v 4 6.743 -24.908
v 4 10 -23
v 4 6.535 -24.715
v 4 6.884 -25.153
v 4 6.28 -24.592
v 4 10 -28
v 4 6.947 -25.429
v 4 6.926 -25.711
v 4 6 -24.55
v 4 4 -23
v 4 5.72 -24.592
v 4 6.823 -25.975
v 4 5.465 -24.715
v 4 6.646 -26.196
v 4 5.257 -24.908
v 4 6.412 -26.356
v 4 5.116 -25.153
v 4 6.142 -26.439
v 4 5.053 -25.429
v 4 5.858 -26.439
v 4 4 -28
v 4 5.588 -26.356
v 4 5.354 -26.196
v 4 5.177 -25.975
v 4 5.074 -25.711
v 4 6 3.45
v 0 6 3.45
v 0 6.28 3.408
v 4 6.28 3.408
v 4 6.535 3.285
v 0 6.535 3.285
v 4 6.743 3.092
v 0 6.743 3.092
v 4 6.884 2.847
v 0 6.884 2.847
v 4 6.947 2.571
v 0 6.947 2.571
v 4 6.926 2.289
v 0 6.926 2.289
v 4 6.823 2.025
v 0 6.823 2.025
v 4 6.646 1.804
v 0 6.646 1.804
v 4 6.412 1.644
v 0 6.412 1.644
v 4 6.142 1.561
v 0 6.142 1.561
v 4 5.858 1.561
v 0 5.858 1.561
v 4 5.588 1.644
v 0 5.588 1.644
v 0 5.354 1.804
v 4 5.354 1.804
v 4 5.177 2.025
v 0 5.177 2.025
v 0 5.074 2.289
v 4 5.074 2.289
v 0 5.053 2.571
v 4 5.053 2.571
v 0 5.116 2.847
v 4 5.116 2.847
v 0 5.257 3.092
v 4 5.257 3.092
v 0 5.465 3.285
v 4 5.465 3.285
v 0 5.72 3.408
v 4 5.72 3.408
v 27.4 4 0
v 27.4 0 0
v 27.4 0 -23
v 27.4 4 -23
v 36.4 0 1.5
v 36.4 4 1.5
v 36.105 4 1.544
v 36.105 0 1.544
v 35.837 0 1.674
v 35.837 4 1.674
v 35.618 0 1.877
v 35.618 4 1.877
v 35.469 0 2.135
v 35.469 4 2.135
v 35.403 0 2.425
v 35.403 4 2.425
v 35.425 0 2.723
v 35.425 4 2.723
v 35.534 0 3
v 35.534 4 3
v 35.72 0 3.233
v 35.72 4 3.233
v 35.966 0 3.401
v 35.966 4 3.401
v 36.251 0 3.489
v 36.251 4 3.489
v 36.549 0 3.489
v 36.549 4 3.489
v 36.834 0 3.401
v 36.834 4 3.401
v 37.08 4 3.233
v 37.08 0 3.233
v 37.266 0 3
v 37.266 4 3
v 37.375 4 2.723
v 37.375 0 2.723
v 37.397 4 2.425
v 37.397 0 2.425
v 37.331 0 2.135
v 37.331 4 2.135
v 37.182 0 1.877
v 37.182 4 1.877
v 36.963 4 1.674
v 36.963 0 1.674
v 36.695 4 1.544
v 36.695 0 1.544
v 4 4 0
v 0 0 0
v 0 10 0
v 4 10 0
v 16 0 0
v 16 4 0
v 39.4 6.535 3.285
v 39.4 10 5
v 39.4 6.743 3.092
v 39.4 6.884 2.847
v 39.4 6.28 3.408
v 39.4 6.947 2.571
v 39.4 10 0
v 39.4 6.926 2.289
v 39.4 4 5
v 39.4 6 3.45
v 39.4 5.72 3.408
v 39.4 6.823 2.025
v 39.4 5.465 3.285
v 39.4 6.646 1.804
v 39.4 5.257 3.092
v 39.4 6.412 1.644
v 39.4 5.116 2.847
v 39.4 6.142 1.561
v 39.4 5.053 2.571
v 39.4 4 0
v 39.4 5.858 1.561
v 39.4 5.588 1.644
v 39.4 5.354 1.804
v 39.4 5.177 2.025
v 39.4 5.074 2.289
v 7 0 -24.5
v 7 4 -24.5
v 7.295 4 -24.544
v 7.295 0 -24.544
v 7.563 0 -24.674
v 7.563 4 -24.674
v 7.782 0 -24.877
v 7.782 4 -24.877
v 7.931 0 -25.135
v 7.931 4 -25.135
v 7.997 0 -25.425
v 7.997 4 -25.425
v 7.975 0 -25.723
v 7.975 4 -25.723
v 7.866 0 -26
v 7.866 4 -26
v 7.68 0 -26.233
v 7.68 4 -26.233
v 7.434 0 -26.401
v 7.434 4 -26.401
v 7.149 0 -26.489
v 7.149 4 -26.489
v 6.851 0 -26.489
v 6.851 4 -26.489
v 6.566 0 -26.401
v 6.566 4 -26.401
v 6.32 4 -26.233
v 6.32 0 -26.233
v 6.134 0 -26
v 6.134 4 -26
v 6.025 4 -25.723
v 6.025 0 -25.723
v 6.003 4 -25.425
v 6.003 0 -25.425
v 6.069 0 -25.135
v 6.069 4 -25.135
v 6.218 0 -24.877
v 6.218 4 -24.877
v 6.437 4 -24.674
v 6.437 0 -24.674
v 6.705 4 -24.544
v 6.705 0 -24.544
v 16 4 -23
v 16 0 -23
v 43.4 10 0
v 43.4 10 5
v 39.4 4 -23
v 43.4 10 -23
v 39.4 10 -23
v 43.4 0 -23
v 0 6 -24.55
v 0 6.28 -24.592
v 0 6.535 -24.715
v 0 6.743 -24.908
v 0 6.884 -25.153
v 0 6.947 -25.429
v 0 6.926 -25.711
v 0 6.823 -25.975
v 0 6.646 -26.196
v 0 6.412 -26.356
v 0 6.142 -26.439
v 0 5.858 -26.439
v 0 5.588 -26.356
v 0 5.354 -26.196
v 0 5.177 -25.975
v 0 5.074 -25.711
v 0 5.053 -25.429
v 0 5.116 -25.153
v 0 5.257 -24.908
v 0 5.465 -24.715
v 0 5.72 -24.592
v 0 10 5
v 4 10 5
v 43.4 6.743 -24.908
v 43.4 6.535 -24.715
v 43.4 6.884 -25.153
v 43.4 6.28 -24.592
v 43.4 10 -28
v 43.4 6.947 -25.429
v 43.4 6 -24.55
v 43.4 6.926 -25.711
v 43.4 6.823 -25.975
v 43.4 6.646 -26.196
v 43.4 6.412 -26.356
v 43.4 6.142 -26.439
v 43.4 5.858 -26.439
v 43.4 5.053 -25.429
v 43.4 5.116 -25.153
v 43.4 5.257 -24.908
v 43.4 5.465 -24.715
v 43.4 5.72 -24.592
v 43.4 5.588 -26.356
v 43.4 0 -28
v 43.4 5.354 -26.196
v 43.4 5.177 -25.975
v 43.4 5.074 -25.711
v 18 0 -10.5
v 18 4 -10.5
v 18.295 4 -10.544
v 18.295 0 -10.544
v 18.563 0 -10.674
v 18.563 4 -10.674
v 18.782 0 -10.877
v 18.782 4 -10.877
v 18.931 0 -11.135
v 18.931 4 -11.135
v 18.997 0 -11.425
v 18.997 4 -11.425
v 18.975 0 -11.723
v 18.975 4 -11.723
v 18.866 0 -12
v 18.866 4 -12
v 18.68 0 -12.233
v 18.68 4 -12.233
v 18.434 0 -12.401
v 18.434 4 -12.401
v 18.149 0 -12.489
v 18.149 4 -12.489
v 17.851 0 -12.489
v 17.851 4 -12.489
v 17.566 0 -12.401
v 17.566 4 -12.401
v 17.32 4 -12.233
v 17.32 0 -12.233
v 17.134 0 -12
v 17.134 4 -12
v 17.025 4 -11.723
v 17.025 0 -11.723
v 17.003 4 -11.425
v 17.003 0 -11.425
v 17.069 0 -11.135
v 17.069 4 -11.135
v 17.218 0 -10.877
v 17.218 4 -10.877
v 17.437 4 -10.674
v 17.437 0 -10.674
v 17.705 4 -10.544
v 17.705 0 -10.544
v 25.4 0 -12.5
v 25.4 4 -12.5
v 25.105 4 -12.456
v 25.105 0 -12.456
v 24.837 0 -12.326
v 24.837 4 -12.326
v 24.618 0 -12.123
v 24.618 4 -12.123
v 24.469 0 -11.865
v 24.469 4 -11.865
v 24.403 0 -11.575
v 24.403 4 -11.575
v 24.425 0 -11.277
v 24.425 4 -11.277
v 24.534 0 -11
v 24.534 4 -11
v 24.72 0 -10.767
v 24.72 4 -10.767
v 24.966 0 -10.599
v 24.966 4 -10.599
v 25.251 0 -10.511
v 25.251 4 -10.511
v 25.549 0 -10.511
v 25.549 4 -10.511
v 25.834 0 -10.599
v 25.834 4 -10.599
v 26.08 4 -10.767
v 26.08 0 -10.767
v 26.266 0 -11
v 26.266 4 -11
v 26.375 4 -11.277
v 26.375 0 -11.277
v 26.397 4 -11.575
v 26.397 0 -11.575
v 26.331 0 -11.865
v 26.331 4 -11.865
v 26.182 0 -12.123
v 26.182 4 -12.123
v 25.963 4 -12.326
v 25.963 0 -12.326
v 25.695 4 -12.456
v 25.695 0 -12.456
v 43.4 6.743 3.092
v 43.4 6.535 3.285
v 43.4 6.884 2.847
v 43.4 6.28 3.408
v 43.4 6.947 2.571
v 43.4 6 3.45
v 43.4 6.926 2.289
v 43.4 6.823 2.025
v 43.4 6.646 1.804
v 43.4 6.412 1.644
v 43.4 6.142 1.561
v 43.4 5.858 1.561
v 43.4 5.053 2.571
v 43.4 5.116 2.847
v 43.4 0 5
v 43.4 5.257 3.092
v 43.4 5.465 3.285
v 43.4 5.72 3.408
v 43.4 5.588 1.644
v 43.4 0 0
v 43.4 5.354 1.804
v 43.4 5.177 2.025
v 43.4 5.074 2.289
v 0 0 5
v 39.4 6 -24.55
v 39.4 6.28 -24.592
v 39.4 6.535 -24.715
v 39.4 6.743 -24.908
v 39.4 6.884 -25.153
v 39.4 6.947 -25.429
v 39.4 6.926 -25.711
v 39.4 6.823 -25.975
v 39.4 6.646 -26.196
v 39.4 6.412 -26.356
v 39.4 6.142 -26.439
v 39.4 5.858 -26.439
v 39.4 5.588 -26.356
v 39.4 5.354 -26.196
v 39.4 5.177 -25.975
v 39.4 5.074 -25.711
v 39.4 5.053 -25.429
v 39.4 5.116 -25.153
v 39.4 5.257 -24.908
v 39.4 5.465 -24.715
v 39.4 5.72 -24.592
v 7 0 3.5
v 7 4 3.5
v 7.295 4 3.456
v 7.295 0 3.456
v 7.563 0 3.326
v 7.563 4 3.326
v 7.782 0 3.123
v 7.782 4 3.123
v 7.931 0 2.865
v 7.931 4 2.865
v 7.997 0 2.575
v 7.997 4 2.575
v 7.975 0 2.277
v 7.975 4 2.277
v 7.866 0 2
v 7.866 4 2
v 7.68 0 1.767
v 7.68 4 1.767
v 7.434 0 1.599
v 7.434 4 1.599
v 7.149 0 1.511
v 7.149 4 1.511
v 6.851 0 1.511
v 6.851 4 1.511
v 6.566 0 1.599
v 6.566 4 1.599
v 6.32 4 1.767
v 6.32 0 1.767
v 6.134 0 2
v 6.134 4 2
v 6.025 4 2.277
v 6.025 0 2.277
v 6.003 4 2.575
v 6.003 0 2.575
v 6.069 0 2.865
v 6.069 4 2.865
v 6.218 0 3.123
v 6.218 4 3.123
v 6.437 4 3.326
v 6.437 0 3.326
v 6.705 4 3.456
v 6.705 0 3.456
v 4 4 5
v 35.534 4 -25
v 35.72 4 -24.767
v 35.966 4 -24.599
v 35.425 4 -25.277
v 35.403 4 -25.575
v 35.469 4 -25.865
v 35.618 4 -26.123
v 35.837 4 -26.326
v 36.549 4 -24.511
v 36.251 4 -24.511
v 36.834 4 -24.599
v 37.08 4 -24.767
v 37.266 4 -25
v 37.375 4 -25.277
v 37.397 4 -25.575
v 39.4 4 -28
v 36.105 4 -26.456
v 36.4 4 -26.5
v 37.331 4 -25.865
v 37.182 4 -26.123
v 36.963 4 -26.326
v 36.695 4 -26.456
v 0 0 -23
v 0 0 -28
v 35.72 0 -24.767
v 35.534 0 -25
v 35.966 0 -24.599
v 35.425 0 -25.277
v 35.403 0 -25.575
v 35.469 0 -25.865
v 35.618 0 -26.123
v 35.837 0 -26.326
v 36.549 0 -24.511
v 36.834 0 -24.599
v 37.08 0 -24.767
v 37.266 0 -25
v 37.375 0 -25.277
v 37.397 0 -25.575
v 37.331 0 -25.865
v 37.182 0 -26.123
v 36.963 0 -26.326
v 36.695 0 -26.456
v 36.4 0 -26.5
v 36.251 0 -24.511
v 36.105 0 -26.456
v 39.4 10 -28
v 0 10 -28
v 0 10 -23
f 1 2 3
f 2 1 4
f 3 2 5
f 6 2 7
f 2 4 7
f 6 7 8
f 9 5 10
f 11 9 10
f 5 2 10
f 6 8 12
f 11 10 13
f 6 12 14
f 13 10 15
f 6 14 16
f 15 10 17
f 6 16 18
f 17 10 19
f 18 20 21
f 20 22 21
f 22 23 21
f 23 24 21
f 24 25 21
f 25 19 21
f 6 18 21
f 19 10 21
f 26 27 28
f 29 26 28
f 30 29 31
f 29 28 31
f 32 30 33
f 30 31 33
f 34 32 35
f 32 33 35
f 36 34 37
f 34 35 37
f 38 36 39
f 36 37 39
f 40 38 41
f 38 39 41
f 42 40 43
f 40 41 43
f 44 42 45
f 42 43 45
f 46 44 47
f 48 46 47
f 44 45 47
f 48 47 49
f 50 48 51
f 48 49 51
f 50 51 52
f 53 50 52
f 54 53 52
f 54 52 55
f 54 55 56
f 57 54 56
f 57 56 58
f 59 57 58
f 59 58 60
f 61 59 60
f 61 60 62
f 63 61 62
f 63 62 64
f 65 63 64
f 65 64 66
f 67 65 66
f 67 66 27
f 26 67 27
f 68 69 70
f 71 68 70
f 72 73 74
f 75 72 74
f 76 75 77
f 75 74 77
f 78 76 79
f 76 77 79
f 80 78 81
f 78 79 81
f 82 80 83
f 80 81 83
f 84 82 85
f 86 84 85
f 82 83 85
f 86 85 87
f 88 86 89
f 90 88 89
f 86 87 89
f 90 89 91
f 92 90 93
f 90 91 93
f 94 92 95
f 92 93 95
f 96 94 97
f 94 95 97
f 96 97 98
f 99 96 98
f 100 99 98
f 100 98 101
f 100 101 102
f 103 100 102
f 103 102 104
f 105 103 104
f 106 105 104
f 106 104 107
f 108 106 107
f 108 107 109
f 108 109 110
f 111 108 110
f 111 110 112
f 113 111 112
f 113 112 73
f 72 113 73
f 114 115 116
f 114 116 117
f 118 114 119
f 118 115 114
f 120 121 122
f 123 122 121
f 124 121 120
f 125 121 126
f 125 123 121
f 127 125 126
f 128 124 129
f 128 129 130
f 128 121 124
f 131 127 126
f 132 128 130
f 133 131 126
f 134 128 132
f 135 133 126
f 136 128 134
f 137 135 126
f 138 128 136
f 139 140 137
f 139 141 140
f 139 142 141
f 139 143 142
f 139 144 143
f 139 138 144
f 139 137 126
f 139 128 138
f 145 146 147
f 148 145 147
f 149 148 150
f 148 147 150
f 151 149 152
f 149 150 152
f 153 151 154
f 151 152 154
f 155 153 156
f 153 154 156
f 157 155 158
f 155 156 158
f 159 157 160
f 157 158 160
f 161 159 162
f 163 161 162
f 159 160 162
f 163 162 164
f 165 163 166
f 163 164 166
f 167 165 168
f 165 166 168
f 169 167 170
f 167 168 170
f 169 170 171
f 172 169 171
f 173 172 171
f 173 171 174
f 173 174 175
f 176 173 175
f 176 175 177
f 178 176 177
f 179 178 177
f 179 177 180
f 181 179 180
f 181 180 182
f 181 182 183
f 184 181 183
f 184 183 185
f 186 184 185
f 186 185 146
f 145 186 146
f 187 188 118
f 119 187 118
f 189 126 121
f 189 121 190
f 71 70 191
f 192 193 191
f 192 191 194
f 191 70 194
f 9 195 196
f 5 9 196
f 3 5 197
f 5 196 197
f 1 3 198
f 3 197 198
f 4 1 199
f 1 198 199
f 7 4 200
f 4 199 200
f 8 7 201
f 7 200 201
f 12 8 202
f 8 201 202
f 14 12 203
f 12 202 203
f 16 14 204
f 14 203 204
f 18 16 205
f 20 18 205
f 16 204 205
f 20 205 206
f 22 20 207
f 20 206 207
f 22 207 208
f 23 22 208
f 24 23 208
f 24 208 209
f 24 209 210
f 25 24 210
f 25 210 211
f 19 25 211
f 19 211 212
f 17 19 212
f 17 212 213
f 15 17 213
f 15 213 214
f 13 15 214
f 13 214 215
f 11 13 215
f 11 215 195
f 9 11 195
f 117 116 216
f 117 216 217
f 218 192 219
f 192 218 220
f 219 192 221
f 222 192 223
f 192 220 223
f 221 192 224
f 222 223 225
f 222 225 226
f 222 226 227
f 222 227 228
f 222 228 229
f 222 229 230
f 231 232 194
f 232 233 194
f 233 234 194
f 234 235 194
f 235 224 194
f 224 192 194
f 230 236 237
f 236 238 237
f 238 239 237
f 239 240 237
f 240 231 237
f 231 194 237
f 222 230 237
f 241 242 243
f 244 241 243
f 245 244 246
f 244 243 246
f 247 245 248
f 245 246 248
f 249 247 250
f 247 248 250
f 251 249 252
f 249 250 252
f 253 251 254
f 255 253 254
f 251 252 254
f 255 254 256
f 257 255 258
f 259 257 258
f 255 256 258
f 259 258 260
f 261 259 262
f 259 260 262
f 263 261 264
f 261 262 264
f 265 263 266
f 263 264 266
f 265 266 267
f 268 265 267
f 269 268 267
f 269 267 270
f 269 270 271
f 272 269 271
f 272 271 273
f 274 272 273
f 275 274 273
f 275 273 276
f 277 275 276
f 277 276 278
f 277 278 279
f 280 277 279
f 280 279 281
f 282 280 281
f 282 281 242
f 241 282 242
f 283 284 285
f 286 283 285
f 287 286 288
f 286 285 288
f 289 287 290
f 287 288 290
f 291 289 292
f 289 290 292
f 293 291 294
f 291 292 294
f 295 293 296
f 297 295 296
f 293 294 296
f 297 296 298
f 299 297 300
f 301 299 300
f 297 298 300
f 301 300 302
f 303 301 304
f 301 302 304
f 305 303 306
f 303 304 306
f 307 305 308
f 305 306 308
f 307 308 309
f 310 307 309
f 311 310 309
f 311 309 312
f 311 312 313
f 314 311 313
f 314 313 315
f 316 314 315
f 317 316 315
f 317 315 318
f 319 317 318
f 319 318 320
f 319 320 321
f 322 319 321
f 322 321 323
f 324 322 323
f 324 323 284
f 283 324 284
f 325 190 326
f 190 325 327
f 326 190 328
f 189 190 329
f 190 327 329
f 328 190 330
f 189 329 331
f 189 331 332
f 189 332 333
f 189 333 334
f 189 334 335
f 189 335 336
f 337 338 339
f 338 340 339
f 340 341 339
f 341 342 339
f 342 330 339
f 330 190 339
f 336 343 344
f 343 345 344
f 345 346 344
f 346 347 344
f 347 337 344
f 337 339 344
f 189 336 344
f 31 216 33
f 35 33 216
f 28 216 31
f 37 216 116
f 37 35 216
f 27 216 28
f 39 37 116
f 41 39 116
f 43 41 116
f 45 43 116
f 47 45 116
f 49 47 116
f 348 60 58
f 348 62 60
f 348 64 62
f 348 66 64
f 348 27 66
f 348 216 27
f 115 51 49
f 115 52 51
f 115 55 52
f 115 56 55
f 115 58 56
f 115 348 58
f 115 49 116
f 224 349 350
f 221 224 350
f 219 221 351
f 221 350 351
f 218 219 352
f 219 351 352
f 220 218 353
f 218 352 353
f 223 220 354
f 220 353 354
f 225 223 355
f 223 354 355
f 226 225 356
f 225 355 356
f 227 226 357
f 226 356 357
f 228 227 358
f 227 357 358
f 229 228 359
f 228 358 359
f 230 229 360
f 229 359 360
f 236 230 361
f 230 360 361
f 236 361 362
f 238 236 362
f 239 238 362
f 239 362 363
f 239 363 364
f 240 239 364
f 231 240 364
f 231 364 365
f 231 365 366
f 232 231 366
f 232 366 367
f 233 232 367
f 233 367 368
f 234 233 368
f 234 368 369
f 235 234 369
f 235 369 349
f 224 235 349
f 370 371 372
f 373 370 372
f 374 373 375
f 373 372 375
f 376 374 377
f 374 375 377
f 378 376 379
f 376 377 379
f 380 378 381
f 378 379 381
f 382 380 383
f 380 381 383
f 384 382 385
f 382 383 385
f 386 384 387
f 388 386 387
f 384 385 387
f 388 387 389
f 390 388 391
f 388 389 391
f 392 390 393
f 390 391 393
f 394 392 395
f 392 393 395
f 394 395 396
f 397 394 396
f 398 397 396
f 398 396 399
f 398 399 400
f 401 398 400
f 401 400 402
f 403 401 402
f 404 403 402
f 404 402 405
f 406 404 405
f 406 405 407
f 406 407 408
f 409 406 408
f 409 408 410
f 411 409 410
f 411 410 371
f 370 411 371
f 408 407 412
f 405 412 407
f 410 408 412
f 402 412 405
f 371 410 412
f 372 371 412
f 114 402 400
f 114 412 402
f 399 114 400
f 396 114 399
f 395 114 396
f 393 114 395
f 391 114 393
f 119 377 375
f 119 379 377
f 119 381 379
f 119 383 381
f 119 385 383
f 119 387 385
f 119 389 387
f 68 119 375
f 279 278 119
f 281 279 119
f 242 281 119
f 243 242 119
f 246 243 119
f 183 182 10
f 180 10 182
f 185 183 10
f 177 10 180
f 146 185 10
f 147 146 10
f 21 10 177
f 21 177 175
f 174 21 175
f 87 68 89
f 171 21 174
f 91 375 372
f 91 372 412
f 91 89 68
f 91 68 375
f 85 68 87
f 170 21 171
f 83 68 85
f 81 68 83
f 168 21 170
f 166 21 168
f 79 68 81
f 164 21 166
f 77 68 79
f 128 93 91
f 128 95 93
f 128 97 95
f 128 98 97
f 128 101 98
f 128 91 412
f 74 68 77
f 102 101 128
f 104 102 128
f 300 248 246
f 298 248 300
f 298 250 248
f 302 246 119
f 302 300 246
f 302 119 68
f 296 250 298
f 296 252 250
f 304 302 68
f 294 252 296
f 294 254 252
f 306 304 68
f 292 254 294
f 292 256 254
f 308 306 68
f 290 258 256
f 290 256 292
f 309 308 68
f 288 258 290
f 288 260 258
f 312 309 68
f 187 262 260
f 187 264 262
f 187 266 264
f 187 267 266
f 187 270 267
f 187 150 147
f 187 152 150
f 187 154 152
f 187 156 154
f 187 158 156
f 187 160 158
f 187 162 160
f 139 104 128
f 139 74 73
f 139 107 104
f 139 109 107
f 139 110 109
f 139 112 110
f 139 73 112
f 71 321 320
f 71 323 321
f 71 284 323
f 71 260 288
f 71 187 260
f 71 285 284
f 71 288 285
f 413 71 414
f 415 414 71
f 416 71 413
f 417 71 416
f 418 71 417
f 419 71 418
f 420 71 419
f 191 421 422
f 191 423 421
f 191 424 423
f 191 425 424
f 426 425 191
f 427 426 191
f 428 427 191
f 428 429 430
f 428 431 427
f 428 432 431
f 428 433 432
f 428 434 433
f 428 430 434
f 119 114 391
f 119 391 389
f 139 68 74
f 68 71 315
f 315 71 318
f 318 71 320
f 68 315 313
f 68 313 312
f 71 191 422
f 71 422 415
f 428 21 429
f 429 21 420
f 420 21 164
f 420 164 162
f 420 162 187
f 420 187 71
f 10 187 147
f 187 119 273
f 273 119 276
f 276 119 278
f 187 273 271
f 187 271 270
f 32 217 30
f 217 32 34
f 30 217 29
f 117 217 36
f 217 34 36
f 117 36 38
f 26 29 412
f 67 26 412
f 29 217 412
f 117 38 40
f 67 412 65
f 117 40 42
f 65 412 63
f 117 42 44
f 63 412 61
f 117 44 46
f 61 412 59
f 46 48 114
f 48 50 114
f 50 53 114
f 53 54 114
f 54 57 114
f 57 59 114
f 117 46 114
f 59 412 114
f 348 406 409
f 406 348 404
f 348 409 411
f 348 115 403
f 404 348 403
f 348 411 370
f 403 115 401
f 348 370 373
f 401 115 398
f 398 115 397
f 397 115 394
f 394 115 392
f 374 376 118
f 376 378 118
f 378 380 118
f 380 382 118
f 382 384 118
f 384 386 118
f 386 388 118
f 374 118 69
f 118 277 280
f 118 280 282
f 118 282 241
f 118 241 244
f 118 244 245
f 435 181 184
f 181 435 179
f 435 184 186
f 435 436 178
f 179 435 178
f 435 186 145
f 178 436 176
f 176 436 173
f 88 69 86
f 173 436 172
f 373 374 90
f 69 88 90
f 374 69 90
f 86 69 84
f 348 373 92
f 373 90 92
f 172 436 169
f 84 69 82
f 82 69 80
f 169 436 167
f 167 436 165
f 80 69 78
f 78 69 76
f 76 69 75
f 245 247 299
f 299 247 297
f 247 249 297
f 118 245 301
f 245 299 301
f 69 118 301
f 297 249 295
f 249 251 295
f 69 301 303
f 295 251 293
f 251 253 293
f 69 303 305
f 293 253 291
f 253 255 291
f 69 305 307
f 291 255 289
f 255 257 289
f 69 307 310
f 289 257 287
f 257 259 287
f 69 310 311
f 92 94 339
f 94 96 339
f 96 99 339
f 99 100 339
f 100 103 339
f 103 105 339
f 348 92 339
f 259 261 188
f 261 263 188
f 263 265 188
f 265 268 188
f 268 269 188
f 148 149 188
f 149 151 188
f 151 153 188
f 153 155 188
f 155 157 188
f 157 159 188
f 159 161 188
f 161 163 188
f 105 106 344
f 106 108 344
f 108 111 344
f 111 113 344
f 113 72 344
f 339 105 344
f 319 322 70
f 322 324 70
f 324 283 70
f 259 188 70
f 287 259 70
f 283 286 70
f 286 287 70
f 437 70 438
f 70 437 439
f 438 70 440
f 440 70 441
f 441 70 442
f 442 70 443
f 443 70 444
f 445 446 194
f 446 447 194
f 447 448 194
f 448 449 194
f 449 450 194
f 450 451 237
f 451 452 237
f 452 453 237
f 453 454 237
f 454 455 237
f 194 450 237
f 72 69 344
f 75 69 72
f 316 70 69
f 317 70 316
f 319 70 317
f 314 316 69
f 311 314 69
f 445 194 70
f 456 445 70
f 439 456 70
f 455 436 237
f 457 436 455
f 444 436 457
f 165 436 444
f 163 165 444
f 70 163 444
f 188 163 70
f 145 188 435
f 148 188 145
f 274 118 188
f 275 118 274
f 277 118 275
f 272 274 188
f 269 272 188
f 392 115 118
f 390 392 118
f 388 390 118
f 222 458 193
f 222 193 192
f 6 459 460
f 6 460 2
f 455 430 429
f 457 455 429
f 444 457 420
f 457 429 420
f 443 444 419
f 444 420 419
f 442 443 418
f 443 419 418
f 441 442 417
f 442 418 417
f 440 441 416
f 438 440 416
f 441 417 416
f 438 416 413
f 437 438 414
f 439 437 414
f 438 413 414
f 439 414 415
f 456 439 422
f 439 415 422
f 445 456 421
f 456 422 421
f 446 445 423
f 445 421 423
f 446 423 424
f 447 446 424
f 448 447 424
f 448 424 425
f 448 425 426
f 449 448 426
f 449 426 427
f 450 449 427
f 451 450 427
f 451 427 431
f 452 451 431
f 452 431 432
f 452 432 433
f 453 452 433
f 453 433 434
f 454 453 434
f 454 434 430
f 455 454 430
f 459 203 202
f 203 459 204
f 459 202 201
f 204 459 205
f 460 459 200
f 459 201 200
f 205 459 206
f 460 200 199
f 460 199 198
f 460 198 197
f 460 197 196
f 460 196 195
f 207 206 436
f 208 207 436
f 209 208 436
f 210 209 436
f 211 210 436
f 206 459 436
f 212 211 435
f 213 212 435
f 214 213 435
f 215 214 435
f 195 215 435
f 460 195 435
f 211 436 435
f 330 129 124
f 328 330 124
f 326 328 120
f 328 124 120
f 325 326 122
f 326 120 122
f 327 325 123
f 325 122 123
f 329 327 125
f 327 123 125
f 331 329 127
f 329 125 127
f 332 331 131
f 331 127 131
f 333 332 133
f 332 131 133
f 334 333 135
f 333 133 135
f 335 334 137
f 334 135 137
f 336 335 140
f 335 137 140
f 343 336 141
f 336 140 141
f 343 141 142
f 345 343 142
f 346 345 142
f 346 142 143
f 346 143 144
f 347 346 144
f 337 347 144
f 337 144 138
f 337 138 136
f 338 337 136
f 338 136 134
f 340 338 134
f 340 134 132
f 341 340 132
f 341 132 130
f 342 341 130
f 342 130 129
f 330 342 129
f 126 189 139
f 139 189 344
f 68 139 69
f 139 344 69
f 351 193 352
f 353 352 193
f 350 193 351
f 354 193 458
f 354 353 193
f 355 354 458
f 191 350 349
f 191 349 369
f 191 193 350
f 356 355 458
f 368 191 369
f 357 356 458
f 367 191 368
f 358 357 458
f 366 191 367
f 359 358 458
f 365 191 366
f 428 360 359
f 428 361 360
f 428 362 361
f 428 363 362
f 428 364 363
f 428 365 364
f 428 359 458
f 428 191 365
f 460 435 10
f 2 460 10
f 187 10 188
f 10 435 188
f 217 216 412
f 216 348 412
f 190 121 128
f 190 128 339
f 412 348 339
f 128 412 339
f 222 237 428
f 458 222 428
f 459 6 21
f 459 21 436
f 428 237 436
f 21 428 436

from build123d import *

# Parameters (mm, degrees)
EXTRUDE_1_DEPTH     = 4
SKETCH_2_W          = 4
SKETCH_2_H          = 5
EXTRUDE_2_DEPTH     = 6
SKETCH_3_R          = 0.95
CUT_EXTRUDE_1_DEPTH = 53.607604013
SKETCH_4_R          = 1
CUT_EXTRUDE_2_DEPTH = 52.995769059


with BuildPart() as part:
    # 草图1 → 凸台-拉伸1 (new body)
    with BuildSketch(Plane(origin=(0, 0, 0), x_dir=(1, 0, 0), z_dir=(0, 1, 0))):
        Polygon((0, 0), (0, -5), (20, -5), (23.4, -5), (43.4, -5), (43.4, 0), (27.4, 0), (27.4, 23), (43.4, 23), (43.4, 28), (23.4, 28), (20, 28), (0, 28), (0, 23), (16, 23), (16, 0), align=None)
    extrude(amount=EXTRUDE_1_DEPTH)

    # 草图2 → 凸台-拉伸2 (add)
    with BuildSketch(Plane(origin=(0, 4, 0), x_dir=(1, 0, 0), z_dir=(0, 1, 0))):
        with Locations((2, -2.5)):
            Rectangle(SKETCH_2_W, SKETCH_2_H)
        with Locations((2, 25.5)):
            Rectangle(SKETCH_2_W, SKETCH_2_H)
        with Locations((41.4, -2.5)):
            Rectangle(SKETCH_2_W, SKETCH_2_H)
        with Locations((41.4, 25.5)):
            Rectangle(SKETCH_2_W, SKETCH_2_H)
    extrude(amount=EXTRUDE_2_DEPTH)

    # 草图3 → 切除-拉伸1 (cut, through all)
    with BuildSketch(Plane.ZY):
        with Locations((2.5, 6)):
            Circle(SKETCH_3_R)
        with Locations((-25.5, 6)):
            Circle(SKETCH_3_R)
    extrude(amount=-CUT_EXTRUDE_1_DEPTH, mode=Mode.SUBTRACT)

    # 草图4 → 切除-拉伸2 (cut, through all)
    with BuildSketch(Plane(origin=(0, 4, 0), x_dir=(1, 0, 0), z_dir=(0, 1, 0))):
        with Locations(Location((7, -2.5, 0), (0, 0, 270))):
            Circle(SKETCH_4_R)
        with Locations(Location((7, 25.5, 0), (0, 0, 270))):
            Circle(SKETCH_4_R)
        with Locations(Location((18, 11.5, 0), (0, 0, 270))):
            Circle(SKETCH_4_R)
        with Locations(Location((36.4, -2.5, 0), (0, 0, 90))):
            Circle(SKETCH_4_R)
        with Locations(Location((36.4, 25.5, 0), (0, 0, 90))):
            Circle(SKETCH_4_R)
        with Locations(Location((25.4, 11.5, 0), (0, 0, 90))):
            Circle(SKETCH_4_R)
    extrude(amount=-CUT_EXTRUDE_2_DEPTH, mode=Mode.SUBTRACT)


solid = part.part
